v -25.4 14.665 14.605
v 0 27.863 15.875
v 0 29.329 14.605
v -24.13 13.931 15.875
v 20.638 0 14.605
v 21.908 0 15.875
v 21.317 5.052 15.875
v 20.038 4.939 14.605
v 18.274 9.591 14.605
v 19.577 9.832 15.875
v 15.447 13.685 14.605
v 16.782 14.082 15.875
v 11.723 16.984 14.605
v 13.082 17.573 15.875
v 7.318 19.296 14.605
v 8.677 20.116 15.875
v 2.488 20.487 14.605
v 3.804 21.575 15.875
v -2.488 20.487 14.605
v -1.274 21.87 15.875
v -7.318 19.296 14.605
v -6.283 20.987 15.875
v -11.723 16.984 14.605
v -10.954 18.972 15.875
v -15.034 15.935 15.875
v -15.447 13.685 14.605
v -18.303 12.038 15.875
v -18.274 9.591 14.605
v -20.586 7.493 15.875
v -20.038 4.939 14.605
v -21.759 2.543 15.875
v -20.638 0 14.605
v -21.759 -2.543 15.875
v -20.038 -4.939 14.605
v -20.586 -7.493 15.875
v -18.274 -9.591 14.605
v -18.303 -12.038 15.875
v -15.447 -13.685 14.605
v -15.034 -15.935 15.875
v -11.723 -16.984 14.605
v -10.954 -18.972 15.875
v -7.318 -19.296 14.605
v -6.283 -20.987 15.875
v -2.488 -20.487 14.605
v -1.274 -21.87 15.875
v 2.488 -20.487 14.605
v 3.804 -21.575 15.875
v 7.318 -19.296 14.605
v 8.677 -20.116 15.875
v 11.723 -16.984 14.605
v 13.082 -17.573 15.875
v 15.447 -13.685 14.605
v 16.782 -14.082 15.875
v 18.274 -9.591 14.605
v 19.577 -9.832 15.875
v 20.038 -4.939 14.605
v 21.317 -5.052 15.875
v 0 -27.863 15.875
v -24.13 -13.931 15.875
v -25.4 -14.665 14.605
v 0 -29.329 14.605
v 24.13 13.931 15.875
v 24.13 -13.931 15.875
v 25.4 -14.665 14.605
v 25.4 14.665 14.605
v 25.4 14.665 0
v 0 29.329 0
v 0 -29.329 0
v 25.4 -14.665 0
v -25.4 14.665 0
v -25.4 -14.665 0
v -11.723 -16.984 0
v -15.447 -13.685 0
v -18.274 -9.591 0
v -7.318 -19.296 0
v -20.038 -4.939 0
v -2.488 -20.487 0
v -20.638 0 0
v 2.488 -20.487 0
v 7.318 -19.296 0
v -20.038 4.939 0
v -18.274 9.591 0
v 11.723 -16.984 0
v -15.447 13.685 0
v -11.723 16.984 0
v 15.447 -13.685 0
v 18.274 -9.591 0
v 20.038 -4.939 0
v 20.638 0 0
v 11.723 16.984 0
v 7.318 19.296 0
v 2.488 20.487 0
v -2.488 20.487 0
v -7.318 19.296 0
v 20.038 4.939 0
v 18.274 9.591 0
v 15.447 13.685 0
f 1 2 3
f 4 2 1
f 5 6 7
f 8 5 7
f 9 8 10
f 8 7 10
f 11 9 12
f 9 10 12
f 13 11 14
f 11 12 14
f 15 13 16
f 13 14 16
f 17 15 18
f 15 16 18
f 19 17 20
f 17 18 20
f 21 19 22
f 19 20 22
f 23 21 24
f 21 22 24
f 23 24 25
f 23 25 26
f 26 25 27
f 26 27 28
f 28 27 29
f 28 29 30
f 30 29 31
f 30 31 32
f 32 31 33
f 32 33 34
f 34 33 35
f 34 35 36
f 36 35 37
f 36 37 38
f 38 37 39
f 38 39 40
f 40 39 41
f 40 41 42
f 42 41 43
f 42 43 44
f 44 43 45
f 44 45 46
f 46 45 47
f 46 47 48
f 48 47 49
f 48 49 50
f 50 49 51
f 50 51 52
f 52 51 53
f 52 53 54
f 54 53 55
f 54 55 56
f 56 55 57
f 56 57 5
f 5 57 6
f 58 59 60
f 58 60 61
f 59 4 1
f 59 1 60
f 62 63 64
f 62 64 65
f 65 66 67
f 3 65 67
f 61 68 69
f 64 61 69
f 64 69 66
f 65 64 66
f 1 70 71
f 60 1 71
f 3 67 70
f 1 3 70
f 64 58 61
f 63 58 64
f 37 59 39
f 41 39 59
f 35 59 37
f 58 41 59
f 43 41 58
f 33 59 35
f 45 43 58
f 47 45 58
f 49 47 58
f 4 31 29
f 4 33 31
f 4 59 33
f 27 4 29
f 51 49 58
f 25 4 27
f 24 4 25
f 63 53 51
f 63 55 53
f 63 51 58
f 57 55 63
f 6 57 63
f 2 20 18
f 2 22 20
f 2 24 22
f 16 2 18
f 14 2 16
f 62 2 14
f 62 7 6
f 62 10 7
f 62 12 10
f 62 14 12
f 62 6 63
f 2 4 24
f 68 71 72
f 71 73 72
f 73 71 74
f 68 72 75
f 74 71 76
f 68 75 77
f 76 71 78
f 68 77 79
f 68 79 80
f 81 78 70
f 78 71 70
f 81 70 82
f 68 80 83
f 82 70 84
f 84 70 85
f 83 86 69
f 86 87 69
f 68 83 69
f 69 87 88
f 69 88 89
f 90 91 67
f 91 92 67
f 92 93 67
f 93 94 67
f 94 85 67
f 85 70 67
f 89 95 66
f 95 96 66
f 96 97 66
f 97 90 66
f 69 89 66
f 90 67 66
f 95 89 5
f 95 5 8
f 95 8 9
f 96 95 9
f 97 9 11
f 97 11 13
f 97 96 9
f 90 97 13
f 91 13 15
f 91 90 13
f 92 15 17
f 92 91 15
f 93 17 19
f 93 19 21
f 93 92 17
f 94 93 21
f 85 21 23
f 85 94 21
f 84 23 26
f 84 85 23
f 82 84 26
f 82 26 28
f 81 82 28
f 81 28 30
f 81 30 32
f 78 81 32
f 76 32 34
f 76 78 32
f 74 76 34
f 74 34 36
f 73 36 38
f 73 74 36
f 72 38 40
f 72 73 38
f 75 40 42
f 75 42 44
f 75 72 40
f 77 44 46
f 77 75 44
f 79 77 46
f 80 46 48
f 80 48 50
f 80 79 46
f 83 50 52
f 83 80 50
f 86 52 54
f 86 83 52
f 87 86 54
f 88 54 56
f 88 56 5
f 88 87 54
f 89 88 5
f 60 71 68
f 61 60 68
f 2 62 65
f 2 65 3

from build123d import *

# Parameters (mm, degrees)
SKETCH1_R           = 20.6375
BOSS_EXTRUDE1_DEPTH = 15.875
CHAMFER1_SIZE       = 1.27


with BuildPart() as part:
    # Sketch1 → Boss-Extrude1 (new body)
    with BuildSketch(Plane.XY):
        Polygon((0, 29.329393675), (-25.4, 14.664696837), (-25.4, -14.664696837), (0, -29.329393675), (25.4, -14.664696837), (25.4, 14.664696837), align=None)
        Circle(SKETCH1_R, mode=Mode.SUBTRACT)
    extrude(amount=BOSS_EXTRUDE1_DEPTH)

    # Chamfer1
    chamfer1_edges = [part.edges().sort_by_distance(p)[0] for p in [
        (-25.4, 0, 15.875),
        (-12.7, -21.997045256, 15.875),
        (12.7, -21.997045256, 15.875),
        (-20.6375, 0, 15.875),
        (25.4, 0, 15.875),
        (12.7, 21.997045256, 15.875),
        (-12.7, 21.997045256, 15.875),
    ]]
    chamfer(chamfer1_edges, length=CHAMFER1_SIZE)


solid = part.part
